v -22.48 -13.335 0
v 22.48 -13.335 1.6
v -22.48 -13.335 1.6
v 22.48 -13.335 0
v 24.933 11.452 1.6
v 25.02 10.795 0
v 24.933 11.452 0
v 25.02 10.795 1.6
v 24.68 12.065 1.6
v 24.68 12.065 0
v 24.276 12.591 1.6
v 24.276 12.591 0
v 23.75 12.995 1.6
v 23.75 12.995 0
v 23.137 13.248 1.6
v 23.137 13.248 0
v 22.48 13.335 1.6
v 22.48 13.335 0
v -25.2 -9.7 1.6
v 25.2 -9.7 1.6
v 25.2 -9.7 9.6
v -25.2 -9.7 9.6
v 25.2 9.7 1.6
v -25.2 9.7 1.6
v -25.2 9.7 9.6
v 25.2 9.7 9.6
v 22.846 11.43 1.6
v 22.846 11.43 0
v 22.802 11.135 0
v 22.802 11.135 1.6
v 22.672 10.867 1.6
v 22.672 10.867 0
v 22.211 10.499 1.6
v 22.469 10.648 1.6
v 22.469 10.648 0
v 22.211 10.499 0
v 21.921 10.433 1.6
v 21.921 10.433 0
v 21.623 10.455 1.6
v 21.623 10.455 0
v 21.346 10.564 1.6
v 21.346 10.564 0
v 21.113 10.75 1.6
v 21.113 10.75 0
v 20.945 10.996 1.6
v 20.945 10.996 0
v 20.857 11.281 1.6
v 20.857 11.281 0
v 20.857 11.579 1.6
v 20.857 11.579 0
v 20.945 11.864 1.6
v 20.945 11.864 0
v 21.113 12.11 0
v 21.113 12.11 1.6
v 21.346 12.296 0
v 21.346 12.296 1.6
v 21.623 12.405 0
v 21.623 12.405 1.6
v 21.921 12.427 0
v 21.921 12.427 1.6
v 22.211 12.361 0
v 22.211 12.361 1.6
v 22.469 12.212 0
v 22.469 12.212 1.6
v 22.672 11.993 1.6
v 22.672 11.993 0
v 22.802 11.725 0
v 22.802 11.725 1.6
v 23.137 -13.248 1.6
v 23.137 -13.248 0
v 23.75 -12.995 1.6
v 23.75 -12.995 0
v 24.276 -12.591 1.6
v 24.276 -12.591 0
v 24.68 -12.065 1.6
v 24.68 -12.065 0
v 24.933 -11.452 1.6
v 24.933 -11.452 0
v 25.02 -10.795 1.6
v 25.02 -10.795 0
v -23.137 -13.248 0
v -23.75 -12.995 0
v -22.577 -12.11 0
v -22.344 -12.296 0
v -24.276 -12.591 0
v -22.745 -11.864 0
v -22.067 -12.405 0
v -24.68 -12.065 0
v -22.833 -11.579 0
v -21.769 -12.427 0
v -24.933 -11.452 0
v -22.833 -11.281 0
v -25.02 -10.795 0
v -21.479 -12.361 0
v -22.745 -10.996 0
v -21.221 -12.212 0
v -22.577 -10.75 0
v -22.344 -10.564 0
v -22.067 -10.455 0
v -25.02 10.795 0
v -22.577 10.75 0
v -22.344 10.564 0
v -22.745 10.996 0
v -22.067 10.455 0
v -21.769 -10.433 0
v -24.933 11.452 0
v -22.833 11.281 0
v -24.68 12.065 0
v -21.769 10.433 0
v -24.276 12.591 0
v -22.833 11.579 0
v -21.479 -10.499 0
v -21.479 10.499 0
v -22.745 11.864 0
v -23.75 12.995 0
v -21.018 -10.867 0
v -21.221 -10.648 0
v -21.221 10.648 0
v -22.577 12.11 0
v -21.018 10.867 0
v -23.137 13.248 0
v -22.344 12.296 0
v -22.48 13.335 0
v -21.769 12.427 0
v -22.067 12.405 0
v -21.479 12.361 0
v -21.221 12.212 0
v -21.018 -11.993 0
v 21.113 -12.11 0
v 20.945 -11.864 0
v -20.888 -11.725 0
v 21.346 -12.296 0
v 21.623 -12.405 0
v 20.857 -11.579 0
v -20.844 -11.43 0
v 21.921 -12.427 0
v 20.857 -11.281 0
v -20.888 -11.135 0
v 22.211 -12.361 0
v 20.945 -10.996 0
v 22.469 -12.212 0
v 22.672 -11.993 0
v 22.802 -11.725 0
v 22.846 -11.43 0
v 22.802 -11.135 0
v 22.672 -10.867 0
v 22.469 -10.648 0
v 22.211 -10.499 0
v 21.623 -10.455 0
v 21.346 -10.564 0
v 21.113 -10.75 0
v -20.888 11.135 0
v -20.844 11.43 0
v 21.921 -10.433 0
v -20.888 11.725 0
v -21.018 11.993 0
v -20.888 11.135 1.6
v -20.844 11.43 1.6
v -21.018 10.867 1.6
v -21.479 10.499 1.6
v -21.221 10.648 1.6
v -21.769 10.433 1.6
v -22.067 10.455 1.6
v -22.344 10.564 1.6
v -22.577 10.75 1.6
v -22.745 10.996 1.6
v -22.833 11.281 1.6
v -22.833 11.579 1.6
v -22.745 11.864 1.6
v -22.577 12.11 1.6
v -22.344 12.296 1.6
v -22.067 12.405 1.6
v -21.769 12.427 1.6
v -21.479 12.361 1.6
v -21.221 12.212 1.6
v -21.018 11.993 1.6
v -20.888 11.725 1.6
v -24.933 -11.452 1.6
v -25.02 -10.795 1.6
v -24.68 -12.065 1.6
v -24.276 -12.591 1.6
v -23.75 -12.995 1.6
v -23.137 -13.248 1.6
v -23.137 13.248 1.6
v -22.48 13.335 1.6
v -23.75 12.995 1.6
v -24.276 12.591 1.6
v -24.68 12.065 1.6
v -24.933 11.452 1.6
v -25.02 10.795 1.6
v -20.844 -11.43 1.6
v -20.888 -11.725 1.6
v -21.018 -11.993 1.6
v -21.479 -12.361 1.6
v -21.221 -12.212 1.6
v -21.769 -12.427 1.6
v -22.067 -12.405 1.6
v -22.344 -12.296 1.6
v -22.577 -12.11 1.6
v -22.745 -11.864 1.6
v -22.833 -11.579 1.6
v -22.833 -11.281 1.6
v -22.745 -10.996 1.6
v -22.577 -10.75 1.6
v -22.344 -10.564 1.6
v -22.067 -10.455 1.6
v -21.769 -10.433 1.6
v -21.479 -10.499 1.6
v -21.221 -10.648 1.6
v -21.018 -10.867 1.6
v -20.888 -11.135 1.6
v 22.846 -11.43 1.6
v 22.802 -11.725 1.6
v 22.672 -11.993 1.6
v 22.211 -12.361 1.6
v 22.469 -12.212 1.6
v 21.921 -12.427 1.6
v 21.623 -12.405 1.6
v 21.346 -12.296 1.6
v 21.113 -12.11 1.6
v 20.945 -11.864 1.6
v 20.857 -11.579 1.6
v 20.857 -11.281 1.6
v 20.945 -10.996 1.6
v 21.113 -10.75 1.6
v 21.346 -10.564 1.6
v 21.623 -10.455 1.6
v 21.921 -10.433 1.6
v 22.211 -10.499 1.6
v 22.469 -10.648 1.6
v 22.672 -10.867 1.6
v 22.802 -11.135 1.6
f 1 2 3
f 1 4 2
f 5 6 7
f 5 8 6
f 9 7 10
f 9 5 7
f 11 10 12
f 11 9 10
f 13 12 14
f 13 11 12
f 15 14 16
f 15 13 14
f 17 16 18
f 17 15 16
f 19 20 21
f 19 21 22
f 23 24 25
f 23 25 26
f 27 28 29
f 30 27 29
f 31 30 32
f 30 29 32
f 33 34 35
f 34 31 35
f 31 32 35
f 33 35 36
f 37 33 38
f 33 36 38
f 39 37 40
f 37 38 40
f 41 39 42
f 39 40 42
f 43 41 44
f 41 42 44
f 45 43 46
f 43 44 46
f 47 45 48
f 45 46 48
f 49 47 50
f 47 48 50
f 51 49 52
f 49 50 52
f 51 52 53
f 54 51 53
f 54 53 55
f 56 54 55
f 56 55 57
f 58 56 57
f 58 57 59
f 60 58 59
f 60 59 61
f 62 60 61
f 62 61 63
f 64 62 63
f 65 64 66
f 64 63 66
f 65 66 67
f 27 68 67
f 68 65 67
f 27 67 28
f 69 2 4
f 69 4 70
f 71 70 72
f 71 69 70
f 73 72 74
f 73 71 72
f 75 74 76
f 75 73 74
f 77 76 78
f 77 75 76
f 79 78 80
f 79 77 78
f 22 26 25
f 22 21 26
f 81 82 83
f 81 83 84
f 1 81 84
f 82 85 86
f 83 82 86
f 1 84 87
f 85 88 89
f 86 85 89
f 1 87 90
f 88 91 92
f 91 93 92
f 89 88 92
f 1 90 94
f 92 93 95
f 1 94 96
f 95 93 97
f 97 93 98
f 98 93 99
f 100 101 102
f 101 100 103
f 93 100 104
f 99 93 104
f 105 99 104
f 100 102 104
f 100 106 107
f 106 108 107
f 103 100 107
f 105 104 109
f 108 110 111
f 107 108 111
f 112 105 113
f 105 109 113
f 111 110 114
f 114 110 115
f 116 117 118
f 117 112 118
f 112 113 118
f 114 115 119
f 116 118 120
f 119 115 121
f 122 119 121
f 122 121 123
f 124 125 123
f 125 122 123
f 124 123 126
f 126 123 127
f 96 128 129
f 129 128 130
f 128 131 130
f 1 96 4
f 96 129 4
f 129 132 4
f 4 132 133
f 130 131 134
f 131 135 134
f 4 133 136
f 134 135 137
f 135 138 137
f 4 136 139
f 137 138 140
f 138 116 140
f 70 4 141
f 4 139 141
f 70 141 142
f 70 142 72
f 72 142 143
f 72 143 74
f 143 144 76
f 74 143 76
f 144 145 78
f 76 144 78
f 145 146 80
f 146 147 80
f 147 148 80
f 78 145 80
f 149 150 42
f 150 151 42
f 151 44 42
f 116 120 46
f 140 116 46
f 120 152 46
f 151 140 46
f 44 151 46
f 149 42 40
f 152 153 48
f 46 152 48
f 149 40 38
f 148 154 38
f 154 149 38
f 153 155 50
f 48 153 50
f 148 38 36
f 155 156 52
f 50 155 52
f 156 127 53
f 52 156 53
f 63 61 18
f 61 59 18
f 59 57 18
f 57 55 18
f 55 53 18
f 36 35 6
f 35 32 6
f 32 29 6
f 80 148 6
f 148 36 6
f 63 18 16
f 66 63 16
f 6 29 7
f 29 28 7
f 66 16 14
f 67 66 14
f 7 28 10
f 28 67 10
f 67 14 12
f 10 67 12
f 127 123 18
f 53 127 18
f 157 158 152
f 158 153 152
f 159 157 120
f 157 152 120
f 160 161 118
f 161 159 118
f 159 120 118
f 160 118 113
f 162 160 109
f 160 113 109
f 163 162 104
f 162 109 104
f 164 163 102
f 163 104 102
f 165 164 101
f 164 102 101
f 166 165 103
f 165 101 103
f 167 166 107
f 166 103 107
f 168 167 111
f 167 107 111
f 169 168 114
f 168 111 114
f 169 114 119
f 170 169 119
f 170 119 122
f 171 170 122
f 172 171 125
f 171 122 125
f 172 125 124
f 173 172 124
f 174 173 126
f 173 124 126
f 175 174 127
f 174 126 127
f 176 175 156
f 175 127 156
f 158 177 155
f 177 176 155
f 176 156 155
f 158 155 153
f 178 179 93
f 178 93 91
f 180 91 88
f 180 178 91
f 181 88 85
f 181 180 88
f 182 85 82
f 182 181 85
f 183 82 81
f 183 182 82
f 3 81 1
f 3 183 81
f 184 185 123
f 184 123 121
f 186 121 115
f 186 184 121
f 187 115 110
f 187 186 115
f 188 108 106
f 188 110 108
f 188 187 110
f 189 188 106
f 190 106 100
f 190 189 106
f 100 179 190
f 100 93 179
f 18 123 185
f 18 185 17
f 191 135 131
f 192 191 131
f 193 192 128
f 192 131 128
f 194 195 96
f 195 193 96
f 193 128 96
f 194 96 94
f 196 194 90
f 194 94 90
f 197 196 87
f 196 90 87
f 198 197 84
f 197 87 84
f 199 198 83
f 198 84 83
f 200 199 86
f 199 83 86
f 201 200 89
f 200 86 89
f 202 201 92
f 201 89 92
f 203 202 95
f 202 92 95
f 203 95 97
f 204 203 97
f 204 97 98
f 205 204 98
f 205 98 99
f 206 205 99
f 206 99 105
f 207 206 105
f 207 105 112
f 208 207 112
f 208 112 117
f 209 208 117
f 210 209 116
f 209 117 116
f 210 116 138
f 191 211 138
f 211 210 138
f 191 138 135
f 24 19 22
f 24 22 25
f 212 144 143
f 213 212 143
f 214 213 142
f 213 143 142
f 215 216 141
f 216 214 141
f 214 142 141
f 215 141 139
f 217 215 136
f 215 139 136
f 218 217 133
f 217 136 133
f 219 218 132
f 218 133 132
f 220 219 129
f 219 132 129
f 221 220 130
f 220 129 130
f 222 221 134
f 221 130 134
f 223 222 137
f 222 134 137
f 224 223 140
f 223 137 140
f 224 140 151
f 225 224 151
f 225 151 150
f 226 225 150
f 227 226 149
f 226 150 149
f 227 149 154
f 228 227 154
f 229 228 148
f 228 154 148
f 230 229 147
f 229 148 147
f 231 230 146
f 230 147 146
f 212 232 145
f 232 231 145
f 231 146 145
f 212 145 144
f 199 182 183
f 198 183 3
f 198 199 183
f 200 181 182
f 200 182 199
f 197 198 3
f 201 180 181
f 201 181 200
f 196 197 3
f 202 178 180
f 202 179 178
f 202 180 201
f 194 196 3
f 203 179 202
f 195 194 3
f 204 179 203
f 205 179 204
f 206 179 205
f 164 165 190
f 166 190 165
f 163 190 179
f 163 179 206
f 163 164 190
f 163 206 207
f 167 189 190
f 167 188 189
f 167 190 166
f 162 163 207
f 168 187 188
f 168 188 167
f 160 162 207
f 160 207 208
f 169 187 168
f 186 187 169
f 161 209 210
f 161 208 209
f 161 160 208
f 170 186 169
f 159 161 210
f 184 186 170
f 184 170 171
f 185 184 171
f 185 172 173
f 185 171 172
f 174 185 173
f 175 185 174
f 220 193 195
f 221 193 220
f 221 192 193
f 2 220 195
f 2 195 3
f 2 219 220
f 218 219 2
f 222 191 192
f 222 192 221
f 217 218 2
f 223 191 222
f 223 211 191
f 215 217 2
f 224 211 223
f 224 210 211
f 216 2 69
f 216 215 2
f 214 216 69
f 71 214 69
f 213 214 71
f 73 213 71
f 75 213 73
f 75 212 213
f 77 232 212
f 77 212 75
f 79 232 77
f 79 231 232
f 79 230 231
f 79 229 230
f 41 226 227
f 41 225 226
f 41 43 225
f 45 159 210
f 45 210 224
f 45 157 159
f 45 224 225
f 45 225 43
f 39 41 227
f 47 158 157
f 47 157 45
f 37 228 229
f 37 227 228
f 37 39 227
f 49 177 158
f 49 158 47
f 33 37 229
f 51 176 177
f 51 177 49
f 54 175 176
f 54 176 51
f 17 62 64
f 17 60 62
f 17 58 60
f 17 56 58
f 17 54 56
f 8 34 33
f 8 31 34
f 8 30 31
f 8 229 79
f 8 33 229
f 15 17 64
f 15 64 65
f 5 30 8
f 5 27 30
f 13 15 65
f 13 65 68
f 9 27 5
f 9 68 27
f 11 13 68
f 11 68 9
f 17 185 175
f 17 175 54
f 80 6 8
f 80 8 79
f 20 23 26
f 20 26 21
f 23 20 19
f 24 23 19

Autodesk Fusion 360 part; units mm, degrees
sketch "Sketch1" plane through (0, 0, 0) normal (0, 0, 1) x (1, 0, 0)
  line L0 (25.02, -13.335) -> (-25.02, -13.335)
  line L1 (-25.02, -13.335) -> (-25.02, 13.335)
  line L2 (-25.02, 13.335) -> (25.02, 13.335)
  line L3 (25.02, 13.335) -> (25.02, -13.335)
  line L4 (25.02, -13.335) -> (-25.02, 13.335) construction
  line L5 (-25.02, -13.335) -> (25.02, 13.335) construction
  circle A0 centre (-21.844, 11.43) radius 1
  circle A1 centre (21.846, 11.43) radius 1
  line L6 (0, 0) -> (25.02, 0) construction
  circle A2 centre (-21.844, -11.43) radius 1
  circle A3 centre (21.846, -11.43) radius 1
  dimension "d1" = 26.67
  dimension "d2" = 50.04
  dimension "d3" = 2
  dimension "d4" = 11.43
  dimension "d5" = 21.844
  dimension "d7" = 43.69
extrude "Extrude1" add sketch "Sketch1" along normal blind 1.6 makes body 1
fillet "Fillet1" radius 2.54 4 edges at (-25.02, 13.335, 0.8) (-25.02, -13.335, 0.8) (25.02, 13.335, 0.8) (25.02, -13.335, 0.8) on bodies 1
sketch "Sketch2" plane through (0, 0, 1.6) normal (0, 0, 1) x (-1, 0, 0)
  arc A0 (-22.48, 13.335) -> (-25.02, 10.795) centre (-22.48, 10.795) ccw
  line L0 (-25.02, 10.795) -> (-25.02, -10.795) construction
  arc A1 (-25.02, -10.795) -> (-22.48, -13.335) centre (-22.48, -10.795) ccw
  line L1 (-22.48, -13.335) -> (22.48, -13.335)
  arc A2 (22.48, -13.335) -> (25.02, -10.795) centre (22.48, -10.795) ccw
  line L2 (25.02, -10.795) -> (25.02, 10.795) construction
  arc A3 (25.02, 10.795) -> (22.48, 13.335) centre (22.48, 10.795) ccw
  line L3 (22.48, 13.335) -> (-22.48, 13.335)
  circle A4 centre (-21.846, 11.43) radius 1 construction
  circle A5 centre (21.844, 11.43) radius 1 construction
  circle A6 centre (-21.846, -11.43) radius 1 construction
  circle A7 centre (21.844, -11.43) radius 1 construction
  line L4 (-25.2, 9.7) -> (25.2, 9.7)
  line L5 (25.2, 9.7) -> (25.2, -9.7)
  line L6 (25.2, -9.7) -> (-25.2, -9.7)
  line L7 (-25.2, -9.7) -> (-25.2, 9.7)
  line L8 (-25.2, 9.7) -> (25.2, -9.7) construction
  line L9 (25.2, 9.7) -> (-25.2, -9.7) construction
  line L10 (-25.5, 10) -> (25.5, 10)
  line L11 (25.5, 10) -> (25.5, -10)
  line L12 (25.5, -10) -> (-25.5, -10)
  line L13 (-25.5, -10) -> (-25.5, 10)
  dimension "d11" = 50.4
  dimension "d12" = 19.4
  dimension "d28" = 0.3
extrude "Extrude2" add sketch "Sketch2" along normal blind 8 separate body contours L4 L5 L6 L7 makes body 2
sketch "Sketch3" plane through (0, 0, 1.6) normal (0, 0, 1) x (-1, 0, 0)
  arc A0 (-22.48, 13.335) -> (-25.02, 10.795) centre (-22.48, 10.795) ccw
  line L0 (-25.02, 10.795) -> (-25.02, -10.795)
  arc A1 (-25.02, -10.795) -> (-22.48, -13.335) centre (-22.48, -10.795) ccw
  line L1 (-22.48, -13.335) -> (22.48, -13.335)
  arc A2 (22.48, -13.335) -> (25.02, -10.795) centre (22.48, -10.795) ccw
  line L2 (25.02, -10.795) -> (25.02, 10.795)
  arc A3 (25.02, 10.795) -> (22.48, 13.335) centre (22.48, 10.795) ccw
  line L3 (22.48, 13.335) -> (-22.48, 13.335)
  circle A4 centre (-21.846, 11.43) radius 1
  circle A5 centre (21.844, 11.43) radius 1
  circle A6 centre (-21.846, -11.43) radius 1
  circle A7 centre (21.844, -11.43) radius 1
  circle A8 centre (21.844, -11.43) radius 1.9
  circle A9 centre (-21.846, -11.43) radius 1.9
  circle A10 centre (21.844, 11.43) radius 1.9
  circle A11 centre (-21.846, 11.43) radius 1.9
  line L4 (27.52, -10.795) -> (27.52, 10.795)
  arc A12 (27.52, 10.795) -> (22.48, 15.835) centre (22.48, 10.795) ccw
  line L5 (22.48, 15.835) -> (-22.48, 15.835)
  arc A13 (-22.48, 15.835) -> (-27.52, 10.795) centre (-22.48, 10.795) ccw
  line L6 (-27.52, 10.795) -> (-27.52, -10.795)
  arc A14 (-27.52, -10.795) -> (-22.48, -15.835) centre (-22.48, -10.795) ccw
  line L7 (-22.48, -15.835) -> (22.48, -15.835)
  arc A15 (22.48, -15.835) -> (27.52, -10.795) centre (22.48, -10.795) ccw
  dimension "d15" = 3.8
  dimension "d16" = 3.8
  dimension "d17" = 3.8
  dimension "d18" = 3.8
  dimension "d19" = 2.5
extrude "Extrude3" add sketch "Sketch3" along normal blind 4 and the other way blind -3 separate body contours A0 L0 A1 L1 A2 L2 A3 L3 | A4 | A5 | A6 | A7 | A8 | A9 | A10 | A11 | L4 A12 L5 A13 L6 A14 L7 A15 makes body 3
extrude "Extrude4" add sketch "Sketch3" along normal blind 3 contours A4 | A5 | A6 | A7 | A8 | A9 | A10 | A11 bodies 3
extrude "Extrude5" add sketch "Sketch3" against normal blind 2 contours A4 | A5 | A6 | A7 bodies 3
extrude "Extrude6" cut sketch "Sketch2" along normal through all contours L4 L5 L6 L7 | L10 L11 L12 L13 bodies 3
hidden bodies 3
